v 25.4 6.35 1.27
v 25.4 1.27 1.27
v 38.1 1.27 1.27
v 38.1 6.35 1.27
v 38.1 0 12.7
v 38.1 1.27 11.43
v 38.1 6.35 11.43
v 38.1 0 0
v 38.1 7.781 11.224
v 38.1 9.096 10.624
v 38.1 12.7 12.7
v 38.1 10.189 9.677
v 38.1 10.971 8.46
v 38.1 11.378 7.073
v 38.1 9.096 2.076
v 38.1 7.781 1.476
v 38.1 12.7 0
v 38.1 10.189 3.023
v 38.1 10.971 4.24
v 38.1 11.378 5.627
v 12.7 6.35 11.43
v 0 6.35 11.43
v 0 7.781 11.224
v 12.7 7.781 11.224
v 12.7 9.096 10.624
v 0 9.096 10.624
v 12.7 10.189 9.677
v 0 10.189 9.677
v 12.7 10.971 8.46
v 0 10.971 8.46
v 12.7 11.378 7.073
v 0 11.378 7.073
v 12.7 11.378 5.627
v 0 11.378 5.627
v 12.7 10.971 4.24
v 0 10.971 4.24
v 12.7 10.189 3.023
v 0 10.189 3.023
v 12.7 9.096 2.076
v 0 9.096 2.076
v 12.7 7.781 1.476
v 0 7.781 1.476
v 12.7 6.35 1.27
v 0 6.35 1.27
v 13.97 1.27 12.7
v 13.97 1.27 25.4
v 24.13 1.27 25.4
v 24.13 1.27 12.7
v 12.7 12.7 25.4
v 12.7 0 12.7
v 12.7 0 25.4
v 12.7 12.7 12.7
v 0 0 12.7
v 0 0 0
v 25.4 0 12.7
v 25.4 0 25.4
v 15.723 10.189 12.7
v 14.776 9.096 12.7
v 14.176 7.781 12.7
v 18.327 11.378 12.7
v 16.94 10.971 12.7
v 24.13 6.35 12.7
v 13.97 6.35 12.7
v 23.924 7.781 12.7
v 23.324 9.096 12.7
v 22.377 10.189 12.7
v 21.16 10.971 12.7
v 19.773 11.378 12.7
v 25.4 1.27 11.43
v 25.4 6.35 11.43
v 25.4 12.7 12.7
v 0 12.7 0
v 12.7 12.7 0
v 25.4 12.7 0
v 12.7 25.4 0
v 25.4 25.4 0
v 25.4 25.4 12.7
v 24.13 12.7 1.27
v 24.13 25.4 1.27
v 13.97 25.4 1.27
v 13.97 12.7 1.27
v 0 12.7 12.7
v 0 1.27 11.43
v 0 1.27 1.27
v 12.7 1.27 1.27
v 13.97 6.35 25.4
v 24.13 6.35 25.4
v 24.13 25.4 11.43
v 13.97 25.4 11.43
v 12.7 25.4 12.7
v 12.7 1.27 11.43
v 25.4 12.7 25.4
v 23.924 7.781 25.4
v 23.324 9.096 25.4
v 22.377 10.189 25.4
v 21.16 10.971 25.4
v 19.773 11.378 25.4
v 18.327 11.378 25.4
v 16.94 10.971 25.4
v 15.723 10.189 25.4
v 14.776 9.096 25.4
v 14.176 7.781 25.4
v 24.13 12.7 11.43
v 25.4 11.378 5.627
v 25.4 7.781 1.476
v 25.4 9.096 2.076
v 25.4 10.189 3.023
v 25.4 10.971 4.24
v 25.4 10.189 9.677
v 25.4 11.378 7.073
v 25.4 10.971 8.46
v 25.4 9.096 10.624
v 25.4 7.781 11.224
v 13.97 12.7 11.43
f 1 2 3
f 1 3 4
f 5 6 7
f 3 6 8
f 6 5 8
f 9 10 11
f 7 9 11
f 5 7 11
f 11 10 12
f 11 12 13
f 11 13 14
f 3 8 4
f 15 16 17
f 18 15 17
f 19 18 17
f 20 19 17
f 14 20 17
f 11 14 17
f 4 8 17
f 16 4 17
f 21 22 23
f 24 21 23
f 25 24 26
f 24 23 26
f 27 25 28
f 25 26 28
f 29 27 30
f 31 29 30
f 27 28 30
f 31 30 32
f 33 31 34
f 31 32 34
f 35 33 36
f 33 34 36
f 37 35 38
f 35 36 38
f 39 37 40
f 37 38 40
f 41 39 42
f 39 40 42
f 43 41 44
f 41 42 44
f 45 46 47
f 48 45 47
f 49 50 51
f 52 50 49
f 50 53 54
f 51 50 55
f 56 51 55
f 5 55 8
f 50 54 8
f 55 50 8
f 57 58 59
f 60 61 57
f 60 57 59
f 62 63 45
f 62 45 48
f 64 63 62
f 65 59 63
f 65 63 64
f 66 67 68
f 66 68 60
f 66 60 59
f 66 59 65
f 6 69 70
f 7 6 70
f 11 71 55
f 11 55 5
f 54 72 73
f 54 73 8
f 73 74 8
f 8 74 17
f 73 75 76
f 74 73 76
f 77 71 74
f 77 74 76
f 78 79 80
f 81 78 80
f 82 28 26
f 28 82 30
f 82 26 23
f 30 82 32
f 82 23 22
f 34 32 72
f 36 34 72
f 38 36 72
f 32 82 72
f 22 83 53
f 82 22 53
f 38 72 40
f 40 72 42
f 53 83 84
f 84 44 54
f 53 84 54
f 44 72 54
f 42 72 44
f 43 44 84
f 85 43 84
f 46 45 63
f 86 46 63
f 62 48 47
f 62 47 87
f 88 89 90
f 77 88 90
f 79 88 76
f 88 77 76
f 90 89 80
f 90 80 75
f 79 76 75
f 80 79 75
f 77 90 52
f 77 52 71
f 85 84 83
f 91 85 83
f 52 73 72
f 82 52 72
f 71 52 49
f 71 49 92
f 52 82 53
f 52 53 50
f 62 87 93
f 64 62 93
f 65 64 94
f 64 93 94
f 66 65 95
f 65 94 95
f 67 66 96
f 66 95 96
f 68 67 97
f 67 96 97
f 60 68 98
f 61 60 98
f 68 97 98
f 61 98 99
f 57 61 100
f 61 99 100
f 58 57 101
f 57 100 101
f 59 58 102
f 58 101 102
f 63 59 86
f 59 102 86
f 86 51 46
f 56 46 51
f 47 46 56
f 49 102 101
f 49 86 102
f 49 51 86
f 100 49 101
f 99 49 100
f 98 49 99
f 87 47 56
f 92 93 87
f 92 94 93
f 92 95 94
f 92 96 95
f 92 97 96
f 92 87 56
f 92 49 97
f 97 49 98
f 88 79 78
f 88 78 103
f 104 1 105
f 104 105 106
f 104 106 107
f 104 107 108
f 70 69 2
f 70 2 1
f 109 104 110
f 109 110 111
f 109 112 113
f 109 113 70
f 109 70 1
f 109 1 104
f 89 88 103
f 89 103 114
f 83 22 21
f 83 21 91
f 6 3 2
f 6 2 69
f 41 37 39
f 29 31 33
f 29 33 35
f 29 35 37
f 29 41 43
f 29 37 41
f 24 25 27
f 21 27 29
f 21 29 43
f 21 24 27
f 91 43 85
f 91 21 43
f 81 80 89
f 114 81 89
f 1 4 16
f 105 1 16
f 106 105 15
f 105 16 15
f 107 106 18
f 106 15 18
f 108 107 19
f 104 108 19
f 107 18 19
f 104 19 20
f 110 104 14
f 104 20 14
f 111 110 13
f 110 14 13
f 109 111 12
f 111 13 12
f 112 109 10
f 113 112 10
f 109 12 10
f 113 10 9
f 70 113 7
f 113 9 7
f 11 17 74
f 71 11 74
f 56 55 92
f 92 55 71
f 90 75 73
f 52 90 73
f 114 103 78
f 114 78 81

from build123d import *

# Parameters (mm, degrees)
F1_DEPTH  = 12.7
F2_W      = 12.7
F2_H      = 12.7
F3_DEPTH  = 12.7
F4_W      = 5.08
F4_H      = 10.16
F6_DEPTH  = 12.7
F7_W      = 10.16
F7_H      = 5.08
F8_DEPTH  = 12.7
F9_W      = 5.08
F9_H      = 10.16
F10_DEPTH = 12.7
F11_W     = 10.16
F11_H     = 10.16
F12_DEPTH = 12.7


with BuildPart() as f1:
    # F0 (on Top) → F1 (new body)
    with BuildSketch(Plane.XY):
        Polygon((0, 12.7), (0, 0), (38.1, 0), (38.1, 12.7), (25.4, 12.7), (25.4, 25.4), (12.7, 25.4), (12.7, 12.7), align=None)
    extrude(amount=F1_DEPTH)

    # F2 (on face) → F3 (join)
    with BuildSketch(Plane.XY.offset(12.7)):
        with Locations((19.05, 6.35)):
            Rectangle(F2_W, F2_H)
    extrude(amount=F3_DEPTH)

    # F4 (on face) → F6 (cut)
    with BuildSketch(Plane.YZ.offset(38.1)):
        with Locations((3.81, 6.35)):
            Rectangle(F4_W, F4_H)
        with BuildLine():
            Line((6.35, 11.43), (6.35, 1.27))
            ThreePointArc((6.35, 1.27), (11.43, 6.35), (6.35, 11.43))
        make_face()
    extrude(amount=-F6_DEPTH, mode=Mode.SUBTRACT)

    # F7 (on face) → F8 (cut)
    with BuildSketch(Plane.XY.offset(25.4)):
        with Locations((19.05, 3.81)):
            Rectangle(F7_W, F7_H)
        with BuildLine():
            Line((13.97, 6.35), (24.13, 6.35))
            ThreePointArc((24.13, 6.35), (19.05, 11.43), (13.97, 6.35))
        make_face()
    extrude(amount=-F8_DEPTH, mode=Mode.SUBTRACT)

    # F9 (on face) → F10 (cut)
    with BuildSketch(Plane(origin=(0, 0, 0), x_dir=(0, -1, 0), z_dir=(-1, 0, 0))):
        with Locations((-3.81, 6.35)):
            Rectangle(F9_W, F9_H)
        with BuildLine():
            Line((-6.35, 1.27), (-6.35, 11.43))
            ThreePointArc((-6.35, 11.43), (-11.43, 6.35), (-6.35, 1.27))
        make_face()
    extrude(amount=-F10_DEPTH, mode=Mode.SUBTRACT)

    # F11 (on face) → F12 (cut)
    with BuildSketch(Plane(origin=(0, 25.4, 0), x_dir=(-1, 0, 0), z_dir=(0, 1, 0))):
        with Locations((-19.05, 6.35)):
            Rectangle(F11_W, F11_H)
    extrude(amount=-F12_DEPTH, mode=Mode.SUBTRACT)


solid = f1.part
